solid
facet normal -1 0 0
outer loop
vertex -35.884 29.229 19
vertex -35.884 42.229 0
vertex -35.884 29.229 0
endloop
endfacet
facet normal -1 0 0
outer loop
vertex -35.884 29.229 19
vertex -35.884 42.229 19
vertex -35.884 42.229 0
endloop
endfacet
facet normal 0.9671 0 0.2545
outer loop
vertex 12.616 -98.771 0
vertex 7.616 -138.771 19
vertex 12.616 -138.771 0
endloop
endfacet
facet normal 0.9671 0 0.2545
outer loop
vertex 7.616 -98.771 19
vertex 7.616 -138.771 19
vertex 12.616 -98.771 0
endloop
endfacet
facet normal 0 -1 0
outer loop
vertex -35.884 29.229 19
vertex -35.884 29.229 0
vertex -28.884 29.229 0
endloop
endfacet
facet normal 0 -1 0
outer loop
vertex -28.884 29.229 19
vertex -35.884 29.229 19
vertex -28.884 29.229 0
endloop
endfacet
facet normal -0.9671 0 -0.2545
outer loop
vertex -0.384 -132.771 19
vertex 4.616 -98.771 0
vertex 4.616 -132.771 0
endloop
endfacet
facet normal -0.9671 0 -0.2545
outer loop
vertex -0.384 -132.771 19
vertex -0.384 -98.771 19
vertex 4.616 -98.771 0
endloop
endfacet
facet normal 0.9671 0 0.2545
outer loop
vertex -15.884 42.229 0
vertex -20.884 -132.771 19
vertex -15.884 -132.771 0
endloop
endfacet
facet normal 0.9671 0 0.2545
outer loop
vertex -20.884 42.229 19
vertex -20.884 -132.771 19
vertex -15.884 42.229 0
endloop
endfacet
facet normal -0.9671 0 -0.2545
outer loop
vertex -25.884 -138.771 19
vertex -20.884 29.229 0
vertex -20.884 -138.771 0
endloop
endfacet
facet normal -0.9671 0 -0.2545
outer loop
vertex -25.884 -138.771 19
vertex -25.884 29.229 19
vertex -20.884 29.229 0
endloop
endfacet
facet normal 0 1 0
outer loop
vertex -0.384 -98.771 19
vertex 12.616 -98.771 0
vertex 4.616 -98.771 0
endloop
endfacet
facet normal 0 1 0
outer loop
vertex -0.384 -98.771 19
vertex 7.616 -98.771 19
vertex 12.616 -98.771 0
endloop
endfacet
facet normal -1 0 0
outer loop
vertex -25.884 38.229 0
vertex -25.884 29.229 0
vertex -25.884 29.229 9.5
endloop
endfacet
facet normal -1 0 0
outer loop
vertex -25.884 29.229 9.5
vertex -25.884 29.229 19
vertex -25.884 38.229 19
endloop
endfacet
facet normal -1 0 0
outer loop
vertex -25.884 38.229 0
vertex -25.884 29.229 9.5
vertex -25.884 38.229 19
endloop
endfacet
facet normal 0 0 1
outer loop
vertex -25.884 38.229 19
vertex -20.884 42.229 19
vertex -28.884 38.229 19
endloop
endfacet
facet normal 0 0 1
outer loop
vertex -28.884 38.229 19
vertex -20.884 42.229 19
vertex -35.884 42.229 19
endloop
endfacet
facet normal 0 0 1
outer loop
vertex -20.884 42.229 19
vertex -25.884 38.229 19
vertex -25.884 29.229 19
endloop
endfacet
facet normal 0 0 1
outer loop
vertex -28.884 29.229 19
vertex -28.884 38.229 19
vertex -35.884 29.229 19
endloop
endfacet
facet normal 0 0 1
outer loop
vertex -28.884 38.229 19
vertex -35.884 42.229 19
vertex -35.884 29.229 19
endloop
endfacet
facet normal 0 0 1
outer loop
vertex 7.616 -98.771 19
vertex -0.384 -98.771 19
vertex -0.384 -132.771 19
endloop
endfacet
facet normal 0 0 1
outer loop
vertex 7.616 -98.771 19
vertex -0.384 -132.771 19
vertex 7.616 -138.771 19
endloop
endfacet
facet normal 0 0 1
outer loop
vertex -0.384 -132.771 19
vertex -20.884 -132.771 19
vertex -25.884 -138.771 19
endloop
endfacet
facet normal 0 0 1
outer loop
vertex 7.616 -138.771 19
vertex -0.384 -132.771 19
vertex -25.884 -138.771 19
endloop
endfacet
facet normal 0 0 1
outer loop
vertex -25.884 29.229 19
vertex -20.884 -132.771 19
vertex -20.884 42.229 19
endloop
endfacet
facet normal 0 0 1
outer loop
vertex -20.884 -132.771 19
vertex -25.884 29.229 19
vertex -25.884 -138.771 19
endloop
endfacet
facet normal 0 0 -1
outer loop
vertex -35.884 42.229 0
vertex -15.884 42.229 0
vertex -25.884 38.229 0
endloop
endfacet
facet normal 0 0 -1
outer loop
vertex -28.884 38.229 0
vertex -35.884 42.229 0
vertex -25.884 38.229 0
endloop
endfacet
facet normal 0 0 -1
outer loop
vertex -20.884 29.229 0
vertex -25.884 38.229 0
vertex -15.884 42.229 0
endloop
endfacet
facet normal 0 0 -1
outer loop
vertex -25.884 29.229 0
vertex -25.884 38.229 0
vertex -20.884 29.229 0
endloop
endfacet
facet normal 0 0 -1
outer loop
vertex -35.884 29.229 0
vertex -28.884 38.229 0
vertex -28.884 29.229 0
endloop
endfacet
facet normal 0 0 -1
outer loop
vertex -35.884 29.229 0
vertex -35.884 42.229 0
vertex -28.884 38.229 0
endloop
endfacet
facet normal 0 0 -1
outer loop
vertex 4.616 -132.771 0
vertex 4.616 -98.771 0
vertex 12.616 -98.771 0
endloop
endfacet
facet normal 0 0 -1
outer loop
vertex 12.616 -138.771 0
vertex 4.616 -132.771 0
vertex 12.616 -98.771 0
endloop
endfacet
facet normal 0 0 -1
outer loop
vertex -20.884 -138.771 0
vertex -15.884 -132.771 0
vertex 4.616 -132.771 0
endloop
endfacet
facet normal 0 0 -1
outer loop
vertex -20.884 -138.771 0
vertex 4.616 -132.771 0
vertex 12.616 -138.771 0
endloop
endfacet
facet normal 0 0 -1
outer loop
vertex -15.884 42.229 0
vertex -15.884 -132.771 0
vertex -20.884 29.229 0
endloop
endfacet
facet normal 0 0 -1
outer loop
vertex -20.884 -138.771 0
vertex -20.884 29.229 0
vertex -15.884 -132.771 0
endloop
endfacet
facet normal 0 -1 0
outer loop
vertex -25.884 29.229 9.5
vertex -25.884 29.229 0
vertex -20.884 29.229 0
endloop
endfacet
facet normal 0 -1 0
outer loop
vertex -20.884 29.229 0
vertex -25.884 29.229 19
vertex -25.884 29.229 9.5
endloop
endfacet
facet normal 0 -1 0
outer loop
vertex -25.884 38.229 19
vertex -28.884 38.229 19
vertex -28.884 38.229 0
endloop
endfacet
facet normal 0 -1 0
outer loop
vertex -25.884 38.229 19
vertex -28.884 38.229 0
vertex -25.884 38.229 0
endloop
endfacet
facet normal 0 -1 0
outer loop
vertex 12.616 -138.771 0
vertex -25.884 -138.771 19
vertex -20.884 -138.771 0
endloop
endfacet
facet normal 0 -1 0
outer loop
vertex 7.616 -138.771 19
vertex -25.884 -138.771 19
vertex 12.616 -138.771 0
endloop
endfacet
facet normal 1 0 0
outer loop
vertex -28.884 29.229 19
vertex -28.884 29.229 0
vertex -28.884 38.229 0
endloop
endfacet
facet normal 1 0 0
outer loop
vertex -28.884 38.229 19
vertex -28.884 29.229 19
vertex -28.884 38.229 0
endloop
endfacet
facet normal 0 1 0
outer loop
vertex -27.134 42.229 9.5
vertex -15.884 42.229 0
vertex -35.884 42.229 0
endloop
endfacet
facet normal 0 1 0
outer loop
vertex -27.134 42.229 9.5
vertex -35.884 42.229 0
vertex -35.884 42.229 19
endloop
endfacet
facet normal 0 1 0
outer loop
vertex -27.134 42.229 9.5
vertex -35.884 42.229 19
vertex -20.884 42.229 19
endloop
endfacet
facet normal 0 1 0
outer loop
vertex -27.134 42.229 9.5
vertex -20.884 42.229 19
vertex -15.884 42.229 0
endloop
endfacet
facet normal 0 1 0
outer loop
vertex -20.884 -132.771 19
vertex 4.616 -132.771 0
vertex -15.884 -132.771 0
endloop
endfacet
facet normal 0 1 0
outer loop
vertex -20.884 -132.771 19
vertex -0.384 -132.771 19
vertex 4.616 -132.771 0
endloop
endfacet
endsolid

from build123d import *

# Parameters (mm, degrees)
F4_W     = 3
F4_H     = 9
F5_DEPTH = 25


with BuildPart() as f3:
    # F0 (on Top) → F3 section 0
    with BuildSketch(Plane.XY):
        Polygon((-35.883552, 29.228954), (-20.883552, 29.228954), (-20.883552, -138.771046), (12.616448, -138.771046), (12.616448, -98.771046), (4.616448, -98.771046), (4.616448, -132.771046), (-15.883552, -132.771046), (-15.883552, 42.228954), (-35.883552, 42.228954), align=None)
    # F2 (on offset) → F3 section 1
    with BuildSketch(Plane.XY.offset(19)):
        Polygon((-35.883552, 29.228954), (-25.883552, 29.228954), (-25.883552, -138.771046), (7.616448, -138.771046), (7.616448, -98.771046), (-0.383552, -98.771046), (-0.383552, -132.771046), (-20.883552, -132.771046), (-20.883552, 42.228954), (-35.883552, 42.228954), align=None)
    loft()

    # F4 (on face) → F5 (cut)
    with BuildSketch(Plane.XY.offset(19)):
        with Locations((-27.383552, 33.728954)):
            Rectangle(F4_W, F4_H)
    extrude(amount=-F5_DEPTH, mode=Mode.SUBTRACT)


solid = f3.part
